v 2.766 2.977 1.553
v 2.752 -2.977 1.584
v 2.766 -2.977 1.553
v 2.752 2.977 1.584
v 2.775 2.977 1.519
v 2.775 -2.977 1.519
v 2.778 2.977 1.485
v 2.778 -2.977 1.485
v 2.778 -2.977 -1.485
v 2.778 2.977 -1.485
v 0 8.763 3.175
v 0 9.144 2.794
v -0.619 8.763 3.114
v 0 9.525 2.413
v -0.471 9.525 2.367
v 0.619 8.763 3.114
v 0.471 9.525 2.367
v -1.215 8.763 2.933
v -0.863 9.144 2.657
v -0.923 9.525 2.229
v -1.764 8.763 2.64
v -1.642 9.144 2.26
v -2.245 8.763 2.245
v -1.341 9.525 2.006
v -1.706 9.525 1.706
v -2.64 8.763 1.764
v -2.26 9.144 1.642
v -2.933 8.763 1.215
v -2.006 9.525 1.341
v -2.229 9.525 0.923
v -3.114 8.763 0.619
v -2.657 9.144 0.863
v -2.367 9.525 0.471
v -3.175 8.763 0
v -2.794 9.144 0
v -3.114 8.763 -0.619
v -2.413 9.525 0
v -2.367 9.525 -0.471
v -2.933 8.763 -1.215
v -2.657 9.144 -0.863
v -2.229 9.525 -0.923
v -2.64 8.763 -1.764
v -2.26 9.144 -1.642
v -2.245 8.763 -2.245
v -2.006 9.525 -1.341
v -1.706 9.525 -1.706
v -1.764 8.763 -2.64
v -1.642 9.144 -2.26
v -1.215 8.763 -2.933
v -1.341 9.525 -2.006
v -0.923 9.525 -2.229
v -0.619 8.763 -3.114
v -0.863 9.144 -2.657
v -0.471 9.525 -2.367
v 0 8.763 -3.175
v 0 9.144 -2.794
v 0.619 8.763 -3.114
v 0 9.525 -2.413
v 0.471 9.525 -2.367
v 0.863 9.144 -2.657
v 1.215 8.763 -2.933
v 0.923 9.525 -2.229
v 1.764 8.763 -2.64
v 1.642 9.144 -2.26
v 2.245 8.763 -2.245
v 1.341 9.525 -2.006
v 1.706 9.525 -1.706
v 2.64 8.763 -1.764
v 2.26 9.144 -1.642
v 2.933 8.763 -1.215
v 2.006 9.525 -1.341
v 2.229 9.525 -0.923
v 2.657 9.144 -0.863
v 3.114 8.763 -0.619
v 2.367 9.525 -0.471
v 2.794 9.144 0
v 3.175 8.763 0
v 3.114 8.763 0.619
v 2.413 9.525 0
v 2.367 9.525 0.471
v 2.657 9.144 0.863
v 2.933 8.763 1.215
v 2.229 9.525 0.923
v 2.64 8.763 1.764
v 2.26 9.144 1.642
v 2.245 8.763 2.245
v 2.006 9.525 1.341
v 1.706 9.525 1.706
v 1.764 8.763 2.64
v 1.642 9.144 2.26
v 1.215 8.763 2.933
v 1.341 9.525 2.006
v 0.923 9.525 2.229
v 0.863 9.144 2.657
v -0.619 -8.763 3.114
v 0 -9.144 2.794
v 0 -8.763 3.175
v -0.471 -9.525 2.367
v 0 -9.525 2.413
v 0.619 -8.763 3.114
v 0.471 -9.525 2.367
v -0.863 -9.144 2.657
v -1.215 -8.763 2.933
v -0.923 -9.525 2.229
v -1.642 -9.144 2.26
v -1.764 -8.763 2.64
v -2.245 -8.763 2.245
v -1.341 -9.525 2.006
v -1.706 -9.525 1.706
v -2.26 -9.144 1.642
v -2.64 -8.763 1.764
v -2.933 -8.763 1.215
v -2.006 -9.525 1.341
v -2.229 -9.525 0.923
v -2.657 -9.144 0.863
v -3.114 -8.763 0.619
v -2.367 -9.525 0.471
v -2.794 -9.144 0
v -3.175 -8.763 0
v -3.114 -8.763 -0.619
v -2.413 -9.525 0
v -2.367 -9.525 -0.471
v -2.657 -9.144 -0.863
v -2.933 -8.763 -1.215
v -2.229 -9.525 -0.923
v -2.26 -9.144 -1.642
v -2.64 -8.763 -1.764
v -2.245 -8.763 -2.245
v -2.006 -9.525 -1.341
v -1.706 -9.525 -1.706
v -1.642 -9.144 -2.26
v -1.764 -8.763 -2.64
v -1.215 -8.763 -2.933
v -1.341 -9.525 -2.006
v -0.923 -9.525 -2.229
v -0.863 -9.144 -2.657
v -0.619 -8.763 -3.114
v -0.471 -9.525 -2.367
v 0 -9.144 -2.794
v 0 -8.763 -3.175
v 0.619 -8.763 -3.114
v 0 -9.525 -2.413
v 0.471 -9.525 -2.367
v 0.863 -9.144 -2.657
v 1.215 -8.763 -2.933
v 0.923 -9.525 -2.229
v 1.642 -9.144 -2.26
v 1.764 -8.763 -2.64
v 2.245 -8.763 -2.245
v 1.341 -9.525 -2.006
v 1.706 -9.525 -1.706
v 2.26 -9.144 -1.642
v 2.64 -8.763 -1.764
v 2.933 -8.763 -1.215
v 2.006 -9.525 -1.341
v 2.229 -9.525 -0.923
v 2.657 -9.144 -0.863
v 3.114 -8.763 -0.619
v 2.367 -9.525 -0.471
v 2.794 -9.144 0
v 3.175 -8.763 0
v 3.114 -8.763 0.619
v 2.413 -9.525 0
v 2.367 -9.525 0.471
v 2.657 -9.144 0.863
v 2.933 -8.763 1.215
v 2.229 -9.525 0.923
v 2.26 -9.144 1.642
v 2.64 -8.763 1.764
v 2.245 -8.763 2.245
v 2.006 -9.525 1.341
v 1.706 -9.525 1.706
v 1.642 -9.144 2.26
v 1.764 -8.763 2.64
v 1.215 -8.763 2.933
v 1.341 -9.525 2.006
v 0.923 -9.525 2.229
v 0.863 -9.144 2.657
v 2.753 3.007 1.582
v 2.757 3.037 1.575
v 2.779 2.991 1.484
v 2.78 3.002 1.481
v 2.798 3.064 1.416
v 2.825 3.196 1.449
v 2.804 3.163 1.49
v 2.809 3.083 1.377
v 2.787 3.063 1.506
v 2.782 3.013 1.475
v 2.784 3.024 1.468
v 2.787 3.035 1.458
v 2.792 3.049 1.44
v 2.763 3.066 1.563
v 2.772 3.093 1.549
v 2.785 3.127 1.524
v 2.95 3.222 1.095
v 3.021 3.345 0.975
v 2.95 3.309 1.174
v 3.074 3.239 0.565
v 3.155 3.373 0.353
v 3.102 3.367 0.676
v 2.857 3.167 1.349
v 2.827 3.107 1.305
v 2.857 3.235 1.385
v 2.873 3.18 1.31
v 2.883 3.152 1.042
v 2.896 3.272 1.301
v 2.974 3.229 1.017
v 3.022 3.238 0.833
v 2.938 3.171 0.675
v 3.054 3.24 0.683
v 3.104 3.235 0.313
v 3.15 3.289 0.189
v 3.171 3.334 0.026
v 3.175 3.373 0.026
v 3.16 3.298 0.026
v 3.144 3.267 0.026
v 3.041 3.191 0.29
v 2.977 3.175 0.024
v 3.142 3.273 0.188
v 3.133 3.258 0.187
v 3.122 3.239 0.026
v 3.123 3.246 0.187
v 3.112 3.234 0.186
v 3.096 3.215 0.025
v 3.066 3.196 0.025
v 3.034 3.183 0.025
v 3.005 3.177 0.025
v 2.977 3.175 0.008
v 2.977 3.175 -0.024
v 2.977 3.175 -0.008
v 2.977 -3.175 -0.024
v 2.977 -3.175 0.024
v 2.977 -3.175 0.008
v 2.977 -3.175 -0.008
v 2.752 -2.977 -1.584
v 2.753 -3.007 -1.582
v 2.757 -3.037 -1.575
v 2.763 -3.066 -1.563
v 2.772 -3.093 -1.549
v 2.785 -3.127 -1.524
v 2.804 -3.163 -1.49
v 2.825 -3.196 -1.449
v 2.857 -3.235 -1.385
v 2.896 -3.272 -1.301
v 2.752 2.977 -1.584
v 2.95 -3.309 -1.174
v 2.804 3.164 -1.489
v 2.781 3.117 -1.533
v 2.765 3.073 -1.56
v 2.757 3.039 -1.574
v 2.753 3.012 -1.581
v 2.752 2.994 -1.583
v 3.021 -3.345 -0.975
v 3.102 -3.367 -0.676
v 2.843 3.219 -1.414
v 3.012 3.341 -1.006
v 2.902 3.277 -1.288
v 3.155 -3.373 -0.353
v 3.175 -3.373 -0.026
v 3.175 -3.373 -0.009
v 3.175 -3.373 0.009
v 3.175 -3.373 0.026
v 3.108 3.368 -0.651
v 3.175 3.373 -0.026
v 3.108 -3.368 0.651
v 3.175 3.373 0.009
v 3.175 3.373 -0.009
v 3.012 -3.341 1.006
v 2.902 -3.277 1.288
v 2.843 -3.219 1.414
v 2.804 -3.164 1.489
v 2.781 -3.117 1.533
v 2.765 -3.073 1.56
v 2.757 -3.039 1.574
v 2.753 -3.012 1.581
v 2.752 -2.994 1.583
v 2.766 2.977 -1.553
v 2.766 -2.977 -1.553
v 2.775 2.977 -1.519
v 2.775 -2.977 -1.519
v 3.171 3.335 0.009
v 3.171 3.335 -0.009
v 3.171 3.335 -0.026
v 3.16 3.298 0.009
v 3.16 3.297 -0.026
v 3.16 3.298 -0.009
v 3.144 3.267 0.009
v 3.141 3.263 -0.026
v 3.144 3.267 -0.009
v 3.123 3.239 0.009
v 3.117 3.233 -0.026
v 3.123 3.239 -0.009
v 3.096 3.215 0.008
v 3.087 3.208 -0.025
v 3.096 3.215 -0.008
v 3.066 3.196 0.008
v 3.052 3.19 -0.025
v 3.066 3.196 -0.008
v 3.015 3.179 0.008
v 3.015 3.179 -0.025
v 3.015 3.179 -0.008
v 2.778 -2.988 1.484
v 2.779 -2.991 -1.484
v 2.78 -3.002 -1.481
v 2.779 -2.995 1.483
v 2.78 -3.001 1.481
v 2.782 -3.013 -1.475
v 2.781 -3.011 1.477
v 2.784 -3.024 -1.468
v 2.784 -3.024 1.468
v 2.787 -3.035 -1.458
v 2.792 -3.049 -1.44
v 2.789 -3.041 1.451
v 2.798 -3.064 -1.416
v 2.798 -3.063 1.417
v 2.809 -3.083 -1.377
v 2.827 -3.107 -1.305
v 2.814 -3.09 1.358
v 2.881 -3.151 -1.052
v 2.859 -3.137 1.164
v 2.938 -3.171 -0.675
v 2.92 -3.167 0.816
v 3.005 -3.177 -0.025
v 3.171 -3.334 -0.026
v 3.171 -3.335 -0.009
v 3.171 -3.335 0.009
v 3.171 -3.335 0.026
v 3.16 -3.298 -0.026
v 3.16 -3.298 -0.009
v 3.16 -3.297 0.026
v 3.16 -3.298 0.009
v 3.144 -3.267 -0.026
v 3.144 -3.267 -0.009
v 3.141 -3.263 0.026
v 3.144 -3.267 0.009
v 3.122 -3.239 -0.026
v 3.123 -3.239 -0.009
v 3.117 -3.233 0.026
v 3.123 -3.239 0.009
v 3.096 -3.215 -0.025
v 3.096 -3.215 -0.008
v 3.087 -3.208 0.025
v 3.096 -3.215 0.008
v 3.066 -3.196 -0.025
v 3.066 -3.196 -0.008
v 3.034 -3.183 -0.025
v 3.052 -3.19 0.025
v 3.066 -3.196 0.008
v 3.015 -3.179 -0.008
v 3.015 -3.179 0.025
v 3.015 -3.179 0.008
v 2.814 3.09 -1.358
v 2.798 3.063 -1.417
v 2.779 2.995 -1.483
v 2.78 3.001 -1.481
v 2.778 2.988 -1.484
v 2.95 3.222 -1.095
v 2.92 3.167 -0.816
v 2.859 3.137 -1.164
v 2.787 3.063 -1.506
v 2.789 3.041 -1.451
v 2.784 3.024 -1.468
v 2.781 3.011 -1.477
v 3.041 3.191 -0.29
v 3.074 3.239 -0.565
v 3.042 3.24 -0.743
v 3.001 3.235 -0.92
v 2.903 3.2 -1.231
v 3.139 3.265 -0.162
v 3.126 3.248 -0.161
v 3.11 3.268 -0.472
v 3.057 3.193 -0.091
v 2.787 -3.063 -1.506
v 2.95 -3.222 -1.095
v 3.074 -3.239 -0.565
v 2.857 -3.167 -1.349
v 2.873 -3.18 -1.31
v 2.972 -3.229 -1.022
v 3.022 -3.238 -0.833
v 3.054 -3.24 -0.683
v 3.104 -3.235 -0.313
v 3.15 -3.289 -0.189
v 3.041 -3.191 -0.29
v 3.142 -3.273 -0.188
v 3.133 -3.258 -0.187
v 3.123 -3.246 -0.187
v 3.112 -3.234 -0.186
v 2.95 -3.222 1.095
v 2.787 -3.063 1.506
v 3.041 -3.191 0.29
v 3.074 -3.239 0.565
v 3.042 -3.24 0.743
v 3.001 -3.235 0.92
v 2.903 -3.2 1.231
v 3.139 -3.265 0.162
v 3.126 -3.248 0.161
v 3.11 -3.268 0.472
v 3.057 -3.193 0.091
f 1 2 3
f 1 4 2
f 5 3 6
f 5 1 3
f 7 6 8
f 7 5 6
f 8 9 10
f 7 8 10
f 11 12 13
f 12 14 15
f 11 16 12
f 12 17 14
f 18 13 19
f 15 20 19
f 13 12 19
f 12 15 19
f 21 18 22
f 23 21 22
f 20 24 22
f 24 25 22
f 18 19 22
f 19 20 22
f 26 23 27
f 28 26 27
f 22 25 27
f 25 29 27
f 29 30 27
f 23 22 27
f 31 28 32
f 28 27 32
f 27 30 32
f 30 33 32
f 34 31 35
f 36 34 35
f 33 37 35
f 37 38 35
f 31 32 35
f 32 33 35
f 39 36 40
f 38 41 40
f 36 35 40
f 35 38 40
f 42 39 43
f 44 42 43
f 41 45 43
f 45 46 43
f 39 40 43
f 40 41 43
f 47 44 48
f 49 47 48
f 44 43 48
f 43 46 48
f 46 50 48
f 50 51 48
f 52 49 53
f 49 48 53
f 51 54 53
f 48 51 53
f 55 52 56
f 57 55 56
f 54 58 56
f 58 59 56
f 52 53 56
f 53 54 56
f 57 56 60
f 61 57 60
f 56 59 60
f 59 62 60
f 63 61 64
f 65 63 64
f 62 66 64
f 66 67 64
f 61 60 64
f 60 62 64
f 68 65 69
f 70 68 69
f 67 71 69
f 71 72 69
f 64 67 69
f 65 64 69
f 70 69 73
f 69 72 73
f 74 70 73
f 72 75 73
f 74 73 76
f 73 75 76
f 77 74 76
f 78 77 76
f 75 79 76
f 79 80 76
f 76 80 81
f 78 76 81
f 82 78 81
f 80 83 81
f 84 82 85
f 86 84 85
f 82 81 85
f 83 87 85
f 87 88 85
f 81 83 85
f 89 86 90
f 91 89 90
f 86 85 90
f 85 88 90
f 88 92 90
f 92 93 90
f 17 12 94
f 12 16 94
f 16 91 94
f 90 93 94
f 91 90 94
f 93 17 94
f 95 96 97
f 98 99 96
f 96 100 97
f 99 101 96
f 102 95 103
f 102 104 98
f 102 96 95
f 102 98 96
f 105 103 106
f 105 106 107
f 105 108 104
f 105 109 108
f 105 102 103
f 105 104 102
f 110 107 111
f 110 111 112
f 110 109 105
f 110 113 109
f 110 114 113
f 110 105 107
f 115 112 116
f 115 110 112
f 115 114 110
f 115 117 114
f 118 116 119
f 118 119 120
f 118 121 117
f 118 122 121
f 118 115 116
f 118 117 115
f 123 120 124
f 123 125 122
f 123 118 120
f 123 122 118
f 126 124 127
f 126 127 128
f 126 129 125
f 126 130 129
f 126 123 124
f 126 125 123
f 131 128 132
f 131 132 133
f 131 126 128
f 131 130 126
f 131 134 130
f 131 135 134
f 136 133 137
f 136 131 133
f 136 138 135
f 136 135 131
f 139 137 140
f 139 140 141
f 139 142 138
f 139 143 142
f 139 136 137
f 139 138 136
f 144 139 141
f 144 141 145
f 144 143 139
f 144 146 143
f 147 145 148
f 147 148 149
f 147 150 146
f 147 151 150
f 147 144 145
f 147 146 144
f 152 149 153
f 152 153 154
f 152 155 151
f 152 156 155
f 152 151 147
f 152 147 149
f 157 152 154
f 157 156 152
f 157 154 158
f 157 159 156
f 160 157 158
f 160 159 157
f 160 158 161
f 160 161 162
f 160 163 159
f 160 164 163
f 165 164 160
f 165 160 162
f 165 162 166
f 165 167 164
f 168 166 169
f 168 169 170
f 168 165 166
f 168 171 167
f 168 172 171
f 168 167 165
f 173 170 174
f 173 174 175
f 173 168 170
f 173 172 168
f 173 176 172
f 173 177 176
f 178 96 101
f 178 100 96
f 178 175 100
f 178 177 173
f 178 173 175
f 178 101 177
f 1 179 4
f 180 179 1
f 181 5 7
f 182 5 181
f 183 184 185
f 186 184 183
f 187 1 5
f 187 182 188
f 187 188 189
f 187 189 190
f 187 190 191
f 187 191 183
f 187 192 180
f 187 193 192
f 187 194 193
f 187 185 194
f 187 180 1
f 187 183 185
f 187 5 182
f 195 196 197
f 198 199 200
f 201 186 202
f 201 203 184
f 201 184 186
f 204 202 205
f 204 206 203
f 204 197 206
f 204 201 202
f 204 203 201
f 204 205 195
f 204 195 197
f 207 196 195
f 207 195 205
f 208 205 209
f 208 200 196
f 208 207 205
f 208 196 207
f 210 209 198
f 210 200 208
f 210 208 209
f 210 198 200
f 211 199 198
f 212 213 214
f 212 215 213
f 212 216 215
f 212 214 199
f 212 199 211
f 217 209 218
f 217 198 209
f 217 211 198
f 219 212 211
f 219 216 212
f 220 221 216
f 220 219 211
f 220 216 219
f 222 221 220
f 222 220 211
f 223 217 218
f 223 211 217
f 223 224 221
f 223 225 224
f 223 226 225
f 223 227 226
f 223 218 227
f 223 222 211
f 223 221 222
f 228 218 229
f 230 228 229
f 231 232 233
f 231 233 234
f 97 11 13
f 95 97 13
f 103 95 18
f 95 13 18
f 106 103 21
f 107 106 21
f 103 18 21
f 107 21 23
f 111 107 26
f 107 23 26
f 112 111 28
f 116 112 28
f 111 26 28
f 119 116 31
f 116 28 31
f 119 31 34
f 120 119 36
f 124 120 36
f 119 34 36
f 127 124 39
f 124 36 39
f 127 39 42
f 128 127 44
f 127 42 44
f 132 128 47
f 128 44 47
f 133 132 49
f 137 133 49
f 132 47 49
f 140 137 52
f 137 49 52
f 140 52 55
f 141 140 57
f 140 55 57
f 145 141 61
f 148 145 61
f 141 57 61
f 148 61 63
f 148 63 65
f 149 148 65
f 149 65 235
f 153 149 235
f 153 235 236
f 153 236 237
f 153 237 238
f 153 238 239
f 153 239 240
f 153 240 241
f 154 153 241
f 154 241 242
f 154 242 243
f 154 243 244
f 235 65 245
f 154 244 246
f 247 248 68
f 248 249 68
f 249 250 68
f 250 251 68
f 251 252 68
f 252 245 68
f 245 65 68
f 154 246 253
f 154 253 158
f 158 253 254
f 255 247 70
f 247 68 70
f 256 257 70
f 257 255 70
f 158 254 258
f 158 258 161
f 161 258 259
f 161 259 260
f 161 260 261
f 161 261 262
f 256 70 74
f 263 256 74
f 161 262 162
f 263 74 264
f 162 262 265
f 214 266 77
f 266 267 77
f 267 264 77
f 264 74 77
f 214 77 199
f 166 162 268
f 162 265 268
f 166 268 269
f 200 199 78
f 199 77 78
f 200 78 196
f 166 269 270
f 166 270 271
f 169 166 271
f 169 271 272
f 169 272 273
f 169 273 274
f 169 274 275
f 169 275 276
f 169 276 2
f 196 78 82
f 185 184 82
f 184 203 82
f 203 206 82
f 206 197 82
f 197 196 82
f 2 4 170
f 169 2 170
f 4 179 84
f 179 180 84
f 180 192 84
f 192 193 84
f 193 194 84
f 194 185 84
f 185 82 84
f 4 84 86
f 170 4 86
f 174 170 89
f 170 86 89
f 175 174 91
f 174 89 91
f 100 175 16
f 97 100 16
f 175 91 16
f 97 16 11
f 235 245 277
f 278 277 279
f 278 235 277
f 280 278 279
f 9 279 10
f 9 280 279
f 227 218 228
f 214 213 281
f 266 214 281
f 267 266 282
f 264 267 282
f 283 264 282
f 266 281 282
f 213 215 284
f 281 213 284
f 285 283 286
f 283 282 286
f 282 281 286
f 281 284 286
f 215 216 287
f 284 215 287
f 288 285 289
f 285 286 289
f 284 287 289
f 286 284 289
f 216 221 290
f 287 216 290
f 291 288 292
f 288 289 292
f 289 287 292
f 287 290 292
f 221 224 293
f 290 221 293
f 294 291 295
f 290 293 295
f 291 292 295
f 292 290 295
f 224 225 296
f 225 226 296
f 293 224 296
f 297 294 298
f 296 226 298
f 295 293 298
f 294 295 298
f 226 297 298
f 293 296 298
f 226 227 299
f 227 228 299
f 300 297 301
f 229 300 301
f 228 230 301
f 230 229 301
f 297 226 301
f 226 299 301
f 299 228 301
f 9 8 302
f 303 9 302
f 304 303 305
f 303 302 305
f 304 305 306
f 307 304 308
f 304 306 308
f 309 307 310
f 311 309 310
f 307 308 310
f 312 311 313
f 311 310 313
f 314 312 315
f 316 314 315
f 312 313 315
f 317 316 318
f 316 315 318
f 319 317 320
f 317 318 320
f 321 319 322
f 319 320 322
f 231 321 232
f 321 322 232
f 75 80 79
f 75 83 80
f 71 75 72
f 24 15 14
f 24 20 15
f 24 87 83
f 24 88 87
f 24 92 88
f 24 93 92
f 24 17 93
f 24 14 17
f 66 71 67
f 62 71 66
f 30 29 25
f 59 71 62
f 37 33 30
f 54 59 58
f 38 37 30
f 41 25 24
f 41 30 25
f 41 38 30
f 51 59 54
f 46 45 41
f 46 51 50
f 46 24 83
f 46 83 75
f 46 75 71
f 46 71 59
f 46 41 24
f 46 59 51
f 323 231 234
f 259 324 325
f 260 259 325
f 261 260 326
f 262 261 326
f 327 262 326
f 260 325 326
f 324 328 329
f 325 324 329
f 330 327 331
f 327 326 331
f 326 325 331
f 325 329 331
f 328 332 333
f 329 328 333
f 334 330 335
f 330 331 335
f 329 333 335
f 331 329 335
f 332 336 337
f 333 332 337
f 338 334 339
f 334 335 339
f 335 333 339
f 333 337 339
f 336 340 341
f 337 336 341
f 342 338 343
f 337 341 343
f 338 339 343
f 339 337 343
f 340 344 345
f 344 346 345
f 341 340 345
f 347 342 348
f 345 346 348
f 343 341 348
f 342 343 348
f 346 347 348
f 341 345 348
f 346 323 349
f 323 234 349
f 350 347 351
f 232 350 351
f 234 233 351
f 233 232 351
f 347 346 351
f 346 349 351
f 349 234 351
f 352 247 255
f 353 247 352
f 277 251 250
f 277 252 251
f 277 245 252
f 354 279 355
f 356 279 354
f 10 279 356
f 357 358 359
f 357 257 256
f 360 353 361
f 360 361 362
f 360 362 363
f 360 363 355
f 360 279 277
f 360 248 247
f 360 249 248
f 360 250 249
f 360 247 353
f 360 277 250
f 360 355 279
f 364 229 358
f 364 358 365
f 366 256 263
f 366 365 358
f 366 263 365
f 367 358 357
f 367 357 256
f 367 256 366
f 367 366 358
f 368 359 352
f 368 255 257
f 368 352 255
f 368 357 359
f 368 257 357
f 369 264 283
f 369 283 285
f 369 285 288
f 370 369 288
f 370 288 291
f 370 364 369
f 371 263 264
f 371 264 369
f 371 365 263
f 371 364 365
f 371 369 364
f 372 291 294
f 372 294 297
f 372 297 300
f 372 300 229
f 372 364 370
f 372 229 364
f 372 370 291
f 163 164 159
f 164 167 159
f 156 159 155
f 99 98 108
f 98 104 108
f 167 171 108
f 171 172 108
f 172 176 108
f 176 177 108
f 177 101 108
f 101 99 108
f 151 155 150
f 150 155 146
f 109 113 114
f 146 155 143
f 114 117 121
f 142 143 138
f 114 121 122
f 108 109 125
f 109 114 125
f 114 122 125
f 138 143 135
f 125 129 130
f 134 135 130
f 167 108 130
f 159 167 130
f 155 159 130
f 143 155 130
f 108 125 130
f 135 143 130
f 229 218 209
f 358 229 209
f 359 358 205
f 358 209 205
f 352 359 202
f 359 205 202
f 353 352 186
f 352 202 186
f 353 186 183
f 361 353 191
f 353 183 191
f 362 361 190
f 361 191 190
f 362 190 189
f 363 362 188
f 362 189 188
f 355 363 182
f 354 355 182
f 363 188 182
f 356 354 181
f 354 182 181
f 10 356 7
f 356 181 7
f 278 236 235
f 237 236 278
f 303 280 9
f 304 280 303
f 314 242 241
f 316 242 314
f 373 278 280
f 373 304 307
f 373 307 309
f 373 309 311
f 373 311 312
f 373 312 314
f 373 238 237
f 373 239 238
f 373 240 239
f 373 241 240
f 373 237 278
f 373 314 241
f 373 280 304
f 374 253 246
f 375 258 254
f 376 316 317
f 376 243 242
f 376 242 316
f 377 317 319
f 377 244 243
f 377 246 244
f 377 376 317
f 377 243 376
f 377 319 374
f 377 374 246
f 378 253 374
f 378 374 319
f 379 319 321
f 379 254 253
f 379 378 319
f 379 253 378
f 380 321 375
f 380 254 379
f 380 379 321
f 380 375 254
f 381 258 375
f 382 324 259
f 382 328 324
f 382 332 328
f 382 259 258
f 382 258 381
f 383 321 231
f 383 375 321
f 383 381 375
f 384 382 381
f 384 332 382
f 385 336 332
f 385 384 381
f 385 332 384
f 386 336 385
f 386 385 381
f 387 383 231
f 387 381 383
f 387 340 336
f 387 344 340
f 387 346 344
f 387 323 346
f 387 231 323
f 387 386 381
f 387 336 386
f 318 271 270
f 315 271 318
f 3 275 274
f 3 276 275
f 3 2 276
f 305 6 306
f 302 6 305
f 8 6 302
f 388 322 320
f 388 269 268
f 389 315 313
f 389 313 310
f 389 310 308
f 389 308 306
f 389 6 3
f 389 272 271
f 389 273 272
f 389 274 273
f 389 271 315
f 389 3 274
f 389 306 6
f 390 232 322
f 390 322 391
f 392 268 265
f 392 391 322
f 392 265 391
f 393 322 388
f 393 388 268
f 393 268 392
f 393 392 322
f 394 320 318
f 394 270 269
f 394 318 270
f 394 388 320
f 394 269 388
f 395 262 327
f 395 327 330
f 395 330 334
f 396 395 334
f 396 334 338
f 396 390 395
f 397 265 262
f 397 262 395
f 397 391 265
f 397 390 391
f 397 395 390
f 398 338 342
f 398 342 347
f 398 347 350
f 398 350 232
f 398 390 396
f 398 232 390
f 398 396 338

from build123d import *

# Parameters (mm, degrees)
SKETCH1_W               = 3.175
SKETCH1_H               = 19.05
CUT_EXTRUDE2_DEPTH      = 11.530283709
CUT_EXTRUDE2_DEPTH_BACK = 11.530283709
SKETCH3_W               = 0.396875
SKETCH3_H               = 6.35
FILLET3_R               = 0.1984375
CHAMFER1_SIZE           = 0.762


with BuildPart() as part:
    # Sketch1 → Revolve1 (revolve)
    with BuildSketch(Plane.XY, mode=Mode.PRIVATE) as revolve1_sk:
        with Locations((1.5875, 0)):
            Rectangle(SKETCH1_W, SKETCH1_H)
    revolve(revolve1_sk.sketch.rotate(Axis((0, 5.054239483, 0), (0, -1, 0)), 90), axis=Axis((0, 5.054239483, 0), (0, -1, 0)))

    # Sketch3 → Cut-Extrude2 (cut, two sides: drawn at the far end of the back side and taken through both)
    with BuildSketch(Plane.XY.offset(-CUT_EXTRUDE2_DEPTH_BACK)):
        with Locations((2.9765625, 0)):
            Rectangle(SKETCH3_W, SKETCH3_H)
    extrude(amount=CUT_EXTRUDE2_DEPTH + CUT_EXTRUDE2_DEPTH_BACK, mode=Mode.SUBTRACT)

    # Fillet3
    fillet3_edges = [part.edges().sort_by_distance(p)[0] for p in [
        (2.778125, -3.175, 0),
        (2.778125, 3.175, 0),
    ]]
    fillet(fillet3_edges, radius=FILLET3_R)
    fillet3_2_edges = [part.edges().sort_by_distance(p)[0] for p in [
        (2.778125, 0, 1.537090266),
        (2.778125, 0, -1.537090266),
        (2.842710111, 3.123058164, -1.414080692),
        (2.842706566, -3.123054925, -1.41408782),
        (2.842710111, 3.123058164, 1.414080692),
        (2.842706566, -3.123054925, 1.41408782),
    ]]
    fillet(fillet3_2_edges, radius=FILLET3_R - 0.0001)  # a hair under: the kernel refuses the full size

    # Chamfer1
    chamfer1_edges = [part.edges().sort_by_distance(p)[0] for p in [
        (0, -9.525, -3.175),
        (0, 9.525, -3.175),
    ]]
    chamfer(chamfer1_edges, length=CHAMFER1_SIZE)


solid = part.part
